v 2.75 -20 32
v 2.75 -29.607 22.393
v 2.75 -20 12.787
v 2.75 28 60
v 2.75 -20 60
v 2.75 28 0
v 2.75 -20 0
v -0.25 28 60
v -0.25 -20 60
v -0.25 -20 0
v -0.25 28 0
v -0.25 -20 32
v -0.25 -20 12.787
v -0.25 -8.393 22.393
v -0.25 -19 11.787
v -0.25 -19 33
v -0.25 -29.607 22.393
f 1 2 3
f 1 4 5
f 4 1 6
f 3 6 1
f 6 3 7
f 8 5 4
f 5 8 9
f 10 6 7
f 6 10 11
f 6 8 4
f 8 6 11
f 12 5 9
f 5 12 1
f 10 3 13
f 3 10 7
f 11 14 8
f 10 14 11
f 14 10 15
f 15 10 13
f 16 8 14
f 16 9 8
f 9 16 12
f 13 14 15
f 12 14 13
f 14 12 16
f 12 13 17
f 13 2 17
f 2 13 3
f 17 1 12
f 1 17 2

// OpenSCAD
difference() {
 translate([-6, 4, 30]) cube(size = [17.5, 48, 60], center = true);
 translate([-10.5, 3, 30]) cube(size = [20.5, 55, 80], center = true);
}

translate([-0.25, -19, 33])
 rotate([0, 90, 0])
  rotate([0, 0, -45])
   cube(size = [15, 15, 3], center = false);
